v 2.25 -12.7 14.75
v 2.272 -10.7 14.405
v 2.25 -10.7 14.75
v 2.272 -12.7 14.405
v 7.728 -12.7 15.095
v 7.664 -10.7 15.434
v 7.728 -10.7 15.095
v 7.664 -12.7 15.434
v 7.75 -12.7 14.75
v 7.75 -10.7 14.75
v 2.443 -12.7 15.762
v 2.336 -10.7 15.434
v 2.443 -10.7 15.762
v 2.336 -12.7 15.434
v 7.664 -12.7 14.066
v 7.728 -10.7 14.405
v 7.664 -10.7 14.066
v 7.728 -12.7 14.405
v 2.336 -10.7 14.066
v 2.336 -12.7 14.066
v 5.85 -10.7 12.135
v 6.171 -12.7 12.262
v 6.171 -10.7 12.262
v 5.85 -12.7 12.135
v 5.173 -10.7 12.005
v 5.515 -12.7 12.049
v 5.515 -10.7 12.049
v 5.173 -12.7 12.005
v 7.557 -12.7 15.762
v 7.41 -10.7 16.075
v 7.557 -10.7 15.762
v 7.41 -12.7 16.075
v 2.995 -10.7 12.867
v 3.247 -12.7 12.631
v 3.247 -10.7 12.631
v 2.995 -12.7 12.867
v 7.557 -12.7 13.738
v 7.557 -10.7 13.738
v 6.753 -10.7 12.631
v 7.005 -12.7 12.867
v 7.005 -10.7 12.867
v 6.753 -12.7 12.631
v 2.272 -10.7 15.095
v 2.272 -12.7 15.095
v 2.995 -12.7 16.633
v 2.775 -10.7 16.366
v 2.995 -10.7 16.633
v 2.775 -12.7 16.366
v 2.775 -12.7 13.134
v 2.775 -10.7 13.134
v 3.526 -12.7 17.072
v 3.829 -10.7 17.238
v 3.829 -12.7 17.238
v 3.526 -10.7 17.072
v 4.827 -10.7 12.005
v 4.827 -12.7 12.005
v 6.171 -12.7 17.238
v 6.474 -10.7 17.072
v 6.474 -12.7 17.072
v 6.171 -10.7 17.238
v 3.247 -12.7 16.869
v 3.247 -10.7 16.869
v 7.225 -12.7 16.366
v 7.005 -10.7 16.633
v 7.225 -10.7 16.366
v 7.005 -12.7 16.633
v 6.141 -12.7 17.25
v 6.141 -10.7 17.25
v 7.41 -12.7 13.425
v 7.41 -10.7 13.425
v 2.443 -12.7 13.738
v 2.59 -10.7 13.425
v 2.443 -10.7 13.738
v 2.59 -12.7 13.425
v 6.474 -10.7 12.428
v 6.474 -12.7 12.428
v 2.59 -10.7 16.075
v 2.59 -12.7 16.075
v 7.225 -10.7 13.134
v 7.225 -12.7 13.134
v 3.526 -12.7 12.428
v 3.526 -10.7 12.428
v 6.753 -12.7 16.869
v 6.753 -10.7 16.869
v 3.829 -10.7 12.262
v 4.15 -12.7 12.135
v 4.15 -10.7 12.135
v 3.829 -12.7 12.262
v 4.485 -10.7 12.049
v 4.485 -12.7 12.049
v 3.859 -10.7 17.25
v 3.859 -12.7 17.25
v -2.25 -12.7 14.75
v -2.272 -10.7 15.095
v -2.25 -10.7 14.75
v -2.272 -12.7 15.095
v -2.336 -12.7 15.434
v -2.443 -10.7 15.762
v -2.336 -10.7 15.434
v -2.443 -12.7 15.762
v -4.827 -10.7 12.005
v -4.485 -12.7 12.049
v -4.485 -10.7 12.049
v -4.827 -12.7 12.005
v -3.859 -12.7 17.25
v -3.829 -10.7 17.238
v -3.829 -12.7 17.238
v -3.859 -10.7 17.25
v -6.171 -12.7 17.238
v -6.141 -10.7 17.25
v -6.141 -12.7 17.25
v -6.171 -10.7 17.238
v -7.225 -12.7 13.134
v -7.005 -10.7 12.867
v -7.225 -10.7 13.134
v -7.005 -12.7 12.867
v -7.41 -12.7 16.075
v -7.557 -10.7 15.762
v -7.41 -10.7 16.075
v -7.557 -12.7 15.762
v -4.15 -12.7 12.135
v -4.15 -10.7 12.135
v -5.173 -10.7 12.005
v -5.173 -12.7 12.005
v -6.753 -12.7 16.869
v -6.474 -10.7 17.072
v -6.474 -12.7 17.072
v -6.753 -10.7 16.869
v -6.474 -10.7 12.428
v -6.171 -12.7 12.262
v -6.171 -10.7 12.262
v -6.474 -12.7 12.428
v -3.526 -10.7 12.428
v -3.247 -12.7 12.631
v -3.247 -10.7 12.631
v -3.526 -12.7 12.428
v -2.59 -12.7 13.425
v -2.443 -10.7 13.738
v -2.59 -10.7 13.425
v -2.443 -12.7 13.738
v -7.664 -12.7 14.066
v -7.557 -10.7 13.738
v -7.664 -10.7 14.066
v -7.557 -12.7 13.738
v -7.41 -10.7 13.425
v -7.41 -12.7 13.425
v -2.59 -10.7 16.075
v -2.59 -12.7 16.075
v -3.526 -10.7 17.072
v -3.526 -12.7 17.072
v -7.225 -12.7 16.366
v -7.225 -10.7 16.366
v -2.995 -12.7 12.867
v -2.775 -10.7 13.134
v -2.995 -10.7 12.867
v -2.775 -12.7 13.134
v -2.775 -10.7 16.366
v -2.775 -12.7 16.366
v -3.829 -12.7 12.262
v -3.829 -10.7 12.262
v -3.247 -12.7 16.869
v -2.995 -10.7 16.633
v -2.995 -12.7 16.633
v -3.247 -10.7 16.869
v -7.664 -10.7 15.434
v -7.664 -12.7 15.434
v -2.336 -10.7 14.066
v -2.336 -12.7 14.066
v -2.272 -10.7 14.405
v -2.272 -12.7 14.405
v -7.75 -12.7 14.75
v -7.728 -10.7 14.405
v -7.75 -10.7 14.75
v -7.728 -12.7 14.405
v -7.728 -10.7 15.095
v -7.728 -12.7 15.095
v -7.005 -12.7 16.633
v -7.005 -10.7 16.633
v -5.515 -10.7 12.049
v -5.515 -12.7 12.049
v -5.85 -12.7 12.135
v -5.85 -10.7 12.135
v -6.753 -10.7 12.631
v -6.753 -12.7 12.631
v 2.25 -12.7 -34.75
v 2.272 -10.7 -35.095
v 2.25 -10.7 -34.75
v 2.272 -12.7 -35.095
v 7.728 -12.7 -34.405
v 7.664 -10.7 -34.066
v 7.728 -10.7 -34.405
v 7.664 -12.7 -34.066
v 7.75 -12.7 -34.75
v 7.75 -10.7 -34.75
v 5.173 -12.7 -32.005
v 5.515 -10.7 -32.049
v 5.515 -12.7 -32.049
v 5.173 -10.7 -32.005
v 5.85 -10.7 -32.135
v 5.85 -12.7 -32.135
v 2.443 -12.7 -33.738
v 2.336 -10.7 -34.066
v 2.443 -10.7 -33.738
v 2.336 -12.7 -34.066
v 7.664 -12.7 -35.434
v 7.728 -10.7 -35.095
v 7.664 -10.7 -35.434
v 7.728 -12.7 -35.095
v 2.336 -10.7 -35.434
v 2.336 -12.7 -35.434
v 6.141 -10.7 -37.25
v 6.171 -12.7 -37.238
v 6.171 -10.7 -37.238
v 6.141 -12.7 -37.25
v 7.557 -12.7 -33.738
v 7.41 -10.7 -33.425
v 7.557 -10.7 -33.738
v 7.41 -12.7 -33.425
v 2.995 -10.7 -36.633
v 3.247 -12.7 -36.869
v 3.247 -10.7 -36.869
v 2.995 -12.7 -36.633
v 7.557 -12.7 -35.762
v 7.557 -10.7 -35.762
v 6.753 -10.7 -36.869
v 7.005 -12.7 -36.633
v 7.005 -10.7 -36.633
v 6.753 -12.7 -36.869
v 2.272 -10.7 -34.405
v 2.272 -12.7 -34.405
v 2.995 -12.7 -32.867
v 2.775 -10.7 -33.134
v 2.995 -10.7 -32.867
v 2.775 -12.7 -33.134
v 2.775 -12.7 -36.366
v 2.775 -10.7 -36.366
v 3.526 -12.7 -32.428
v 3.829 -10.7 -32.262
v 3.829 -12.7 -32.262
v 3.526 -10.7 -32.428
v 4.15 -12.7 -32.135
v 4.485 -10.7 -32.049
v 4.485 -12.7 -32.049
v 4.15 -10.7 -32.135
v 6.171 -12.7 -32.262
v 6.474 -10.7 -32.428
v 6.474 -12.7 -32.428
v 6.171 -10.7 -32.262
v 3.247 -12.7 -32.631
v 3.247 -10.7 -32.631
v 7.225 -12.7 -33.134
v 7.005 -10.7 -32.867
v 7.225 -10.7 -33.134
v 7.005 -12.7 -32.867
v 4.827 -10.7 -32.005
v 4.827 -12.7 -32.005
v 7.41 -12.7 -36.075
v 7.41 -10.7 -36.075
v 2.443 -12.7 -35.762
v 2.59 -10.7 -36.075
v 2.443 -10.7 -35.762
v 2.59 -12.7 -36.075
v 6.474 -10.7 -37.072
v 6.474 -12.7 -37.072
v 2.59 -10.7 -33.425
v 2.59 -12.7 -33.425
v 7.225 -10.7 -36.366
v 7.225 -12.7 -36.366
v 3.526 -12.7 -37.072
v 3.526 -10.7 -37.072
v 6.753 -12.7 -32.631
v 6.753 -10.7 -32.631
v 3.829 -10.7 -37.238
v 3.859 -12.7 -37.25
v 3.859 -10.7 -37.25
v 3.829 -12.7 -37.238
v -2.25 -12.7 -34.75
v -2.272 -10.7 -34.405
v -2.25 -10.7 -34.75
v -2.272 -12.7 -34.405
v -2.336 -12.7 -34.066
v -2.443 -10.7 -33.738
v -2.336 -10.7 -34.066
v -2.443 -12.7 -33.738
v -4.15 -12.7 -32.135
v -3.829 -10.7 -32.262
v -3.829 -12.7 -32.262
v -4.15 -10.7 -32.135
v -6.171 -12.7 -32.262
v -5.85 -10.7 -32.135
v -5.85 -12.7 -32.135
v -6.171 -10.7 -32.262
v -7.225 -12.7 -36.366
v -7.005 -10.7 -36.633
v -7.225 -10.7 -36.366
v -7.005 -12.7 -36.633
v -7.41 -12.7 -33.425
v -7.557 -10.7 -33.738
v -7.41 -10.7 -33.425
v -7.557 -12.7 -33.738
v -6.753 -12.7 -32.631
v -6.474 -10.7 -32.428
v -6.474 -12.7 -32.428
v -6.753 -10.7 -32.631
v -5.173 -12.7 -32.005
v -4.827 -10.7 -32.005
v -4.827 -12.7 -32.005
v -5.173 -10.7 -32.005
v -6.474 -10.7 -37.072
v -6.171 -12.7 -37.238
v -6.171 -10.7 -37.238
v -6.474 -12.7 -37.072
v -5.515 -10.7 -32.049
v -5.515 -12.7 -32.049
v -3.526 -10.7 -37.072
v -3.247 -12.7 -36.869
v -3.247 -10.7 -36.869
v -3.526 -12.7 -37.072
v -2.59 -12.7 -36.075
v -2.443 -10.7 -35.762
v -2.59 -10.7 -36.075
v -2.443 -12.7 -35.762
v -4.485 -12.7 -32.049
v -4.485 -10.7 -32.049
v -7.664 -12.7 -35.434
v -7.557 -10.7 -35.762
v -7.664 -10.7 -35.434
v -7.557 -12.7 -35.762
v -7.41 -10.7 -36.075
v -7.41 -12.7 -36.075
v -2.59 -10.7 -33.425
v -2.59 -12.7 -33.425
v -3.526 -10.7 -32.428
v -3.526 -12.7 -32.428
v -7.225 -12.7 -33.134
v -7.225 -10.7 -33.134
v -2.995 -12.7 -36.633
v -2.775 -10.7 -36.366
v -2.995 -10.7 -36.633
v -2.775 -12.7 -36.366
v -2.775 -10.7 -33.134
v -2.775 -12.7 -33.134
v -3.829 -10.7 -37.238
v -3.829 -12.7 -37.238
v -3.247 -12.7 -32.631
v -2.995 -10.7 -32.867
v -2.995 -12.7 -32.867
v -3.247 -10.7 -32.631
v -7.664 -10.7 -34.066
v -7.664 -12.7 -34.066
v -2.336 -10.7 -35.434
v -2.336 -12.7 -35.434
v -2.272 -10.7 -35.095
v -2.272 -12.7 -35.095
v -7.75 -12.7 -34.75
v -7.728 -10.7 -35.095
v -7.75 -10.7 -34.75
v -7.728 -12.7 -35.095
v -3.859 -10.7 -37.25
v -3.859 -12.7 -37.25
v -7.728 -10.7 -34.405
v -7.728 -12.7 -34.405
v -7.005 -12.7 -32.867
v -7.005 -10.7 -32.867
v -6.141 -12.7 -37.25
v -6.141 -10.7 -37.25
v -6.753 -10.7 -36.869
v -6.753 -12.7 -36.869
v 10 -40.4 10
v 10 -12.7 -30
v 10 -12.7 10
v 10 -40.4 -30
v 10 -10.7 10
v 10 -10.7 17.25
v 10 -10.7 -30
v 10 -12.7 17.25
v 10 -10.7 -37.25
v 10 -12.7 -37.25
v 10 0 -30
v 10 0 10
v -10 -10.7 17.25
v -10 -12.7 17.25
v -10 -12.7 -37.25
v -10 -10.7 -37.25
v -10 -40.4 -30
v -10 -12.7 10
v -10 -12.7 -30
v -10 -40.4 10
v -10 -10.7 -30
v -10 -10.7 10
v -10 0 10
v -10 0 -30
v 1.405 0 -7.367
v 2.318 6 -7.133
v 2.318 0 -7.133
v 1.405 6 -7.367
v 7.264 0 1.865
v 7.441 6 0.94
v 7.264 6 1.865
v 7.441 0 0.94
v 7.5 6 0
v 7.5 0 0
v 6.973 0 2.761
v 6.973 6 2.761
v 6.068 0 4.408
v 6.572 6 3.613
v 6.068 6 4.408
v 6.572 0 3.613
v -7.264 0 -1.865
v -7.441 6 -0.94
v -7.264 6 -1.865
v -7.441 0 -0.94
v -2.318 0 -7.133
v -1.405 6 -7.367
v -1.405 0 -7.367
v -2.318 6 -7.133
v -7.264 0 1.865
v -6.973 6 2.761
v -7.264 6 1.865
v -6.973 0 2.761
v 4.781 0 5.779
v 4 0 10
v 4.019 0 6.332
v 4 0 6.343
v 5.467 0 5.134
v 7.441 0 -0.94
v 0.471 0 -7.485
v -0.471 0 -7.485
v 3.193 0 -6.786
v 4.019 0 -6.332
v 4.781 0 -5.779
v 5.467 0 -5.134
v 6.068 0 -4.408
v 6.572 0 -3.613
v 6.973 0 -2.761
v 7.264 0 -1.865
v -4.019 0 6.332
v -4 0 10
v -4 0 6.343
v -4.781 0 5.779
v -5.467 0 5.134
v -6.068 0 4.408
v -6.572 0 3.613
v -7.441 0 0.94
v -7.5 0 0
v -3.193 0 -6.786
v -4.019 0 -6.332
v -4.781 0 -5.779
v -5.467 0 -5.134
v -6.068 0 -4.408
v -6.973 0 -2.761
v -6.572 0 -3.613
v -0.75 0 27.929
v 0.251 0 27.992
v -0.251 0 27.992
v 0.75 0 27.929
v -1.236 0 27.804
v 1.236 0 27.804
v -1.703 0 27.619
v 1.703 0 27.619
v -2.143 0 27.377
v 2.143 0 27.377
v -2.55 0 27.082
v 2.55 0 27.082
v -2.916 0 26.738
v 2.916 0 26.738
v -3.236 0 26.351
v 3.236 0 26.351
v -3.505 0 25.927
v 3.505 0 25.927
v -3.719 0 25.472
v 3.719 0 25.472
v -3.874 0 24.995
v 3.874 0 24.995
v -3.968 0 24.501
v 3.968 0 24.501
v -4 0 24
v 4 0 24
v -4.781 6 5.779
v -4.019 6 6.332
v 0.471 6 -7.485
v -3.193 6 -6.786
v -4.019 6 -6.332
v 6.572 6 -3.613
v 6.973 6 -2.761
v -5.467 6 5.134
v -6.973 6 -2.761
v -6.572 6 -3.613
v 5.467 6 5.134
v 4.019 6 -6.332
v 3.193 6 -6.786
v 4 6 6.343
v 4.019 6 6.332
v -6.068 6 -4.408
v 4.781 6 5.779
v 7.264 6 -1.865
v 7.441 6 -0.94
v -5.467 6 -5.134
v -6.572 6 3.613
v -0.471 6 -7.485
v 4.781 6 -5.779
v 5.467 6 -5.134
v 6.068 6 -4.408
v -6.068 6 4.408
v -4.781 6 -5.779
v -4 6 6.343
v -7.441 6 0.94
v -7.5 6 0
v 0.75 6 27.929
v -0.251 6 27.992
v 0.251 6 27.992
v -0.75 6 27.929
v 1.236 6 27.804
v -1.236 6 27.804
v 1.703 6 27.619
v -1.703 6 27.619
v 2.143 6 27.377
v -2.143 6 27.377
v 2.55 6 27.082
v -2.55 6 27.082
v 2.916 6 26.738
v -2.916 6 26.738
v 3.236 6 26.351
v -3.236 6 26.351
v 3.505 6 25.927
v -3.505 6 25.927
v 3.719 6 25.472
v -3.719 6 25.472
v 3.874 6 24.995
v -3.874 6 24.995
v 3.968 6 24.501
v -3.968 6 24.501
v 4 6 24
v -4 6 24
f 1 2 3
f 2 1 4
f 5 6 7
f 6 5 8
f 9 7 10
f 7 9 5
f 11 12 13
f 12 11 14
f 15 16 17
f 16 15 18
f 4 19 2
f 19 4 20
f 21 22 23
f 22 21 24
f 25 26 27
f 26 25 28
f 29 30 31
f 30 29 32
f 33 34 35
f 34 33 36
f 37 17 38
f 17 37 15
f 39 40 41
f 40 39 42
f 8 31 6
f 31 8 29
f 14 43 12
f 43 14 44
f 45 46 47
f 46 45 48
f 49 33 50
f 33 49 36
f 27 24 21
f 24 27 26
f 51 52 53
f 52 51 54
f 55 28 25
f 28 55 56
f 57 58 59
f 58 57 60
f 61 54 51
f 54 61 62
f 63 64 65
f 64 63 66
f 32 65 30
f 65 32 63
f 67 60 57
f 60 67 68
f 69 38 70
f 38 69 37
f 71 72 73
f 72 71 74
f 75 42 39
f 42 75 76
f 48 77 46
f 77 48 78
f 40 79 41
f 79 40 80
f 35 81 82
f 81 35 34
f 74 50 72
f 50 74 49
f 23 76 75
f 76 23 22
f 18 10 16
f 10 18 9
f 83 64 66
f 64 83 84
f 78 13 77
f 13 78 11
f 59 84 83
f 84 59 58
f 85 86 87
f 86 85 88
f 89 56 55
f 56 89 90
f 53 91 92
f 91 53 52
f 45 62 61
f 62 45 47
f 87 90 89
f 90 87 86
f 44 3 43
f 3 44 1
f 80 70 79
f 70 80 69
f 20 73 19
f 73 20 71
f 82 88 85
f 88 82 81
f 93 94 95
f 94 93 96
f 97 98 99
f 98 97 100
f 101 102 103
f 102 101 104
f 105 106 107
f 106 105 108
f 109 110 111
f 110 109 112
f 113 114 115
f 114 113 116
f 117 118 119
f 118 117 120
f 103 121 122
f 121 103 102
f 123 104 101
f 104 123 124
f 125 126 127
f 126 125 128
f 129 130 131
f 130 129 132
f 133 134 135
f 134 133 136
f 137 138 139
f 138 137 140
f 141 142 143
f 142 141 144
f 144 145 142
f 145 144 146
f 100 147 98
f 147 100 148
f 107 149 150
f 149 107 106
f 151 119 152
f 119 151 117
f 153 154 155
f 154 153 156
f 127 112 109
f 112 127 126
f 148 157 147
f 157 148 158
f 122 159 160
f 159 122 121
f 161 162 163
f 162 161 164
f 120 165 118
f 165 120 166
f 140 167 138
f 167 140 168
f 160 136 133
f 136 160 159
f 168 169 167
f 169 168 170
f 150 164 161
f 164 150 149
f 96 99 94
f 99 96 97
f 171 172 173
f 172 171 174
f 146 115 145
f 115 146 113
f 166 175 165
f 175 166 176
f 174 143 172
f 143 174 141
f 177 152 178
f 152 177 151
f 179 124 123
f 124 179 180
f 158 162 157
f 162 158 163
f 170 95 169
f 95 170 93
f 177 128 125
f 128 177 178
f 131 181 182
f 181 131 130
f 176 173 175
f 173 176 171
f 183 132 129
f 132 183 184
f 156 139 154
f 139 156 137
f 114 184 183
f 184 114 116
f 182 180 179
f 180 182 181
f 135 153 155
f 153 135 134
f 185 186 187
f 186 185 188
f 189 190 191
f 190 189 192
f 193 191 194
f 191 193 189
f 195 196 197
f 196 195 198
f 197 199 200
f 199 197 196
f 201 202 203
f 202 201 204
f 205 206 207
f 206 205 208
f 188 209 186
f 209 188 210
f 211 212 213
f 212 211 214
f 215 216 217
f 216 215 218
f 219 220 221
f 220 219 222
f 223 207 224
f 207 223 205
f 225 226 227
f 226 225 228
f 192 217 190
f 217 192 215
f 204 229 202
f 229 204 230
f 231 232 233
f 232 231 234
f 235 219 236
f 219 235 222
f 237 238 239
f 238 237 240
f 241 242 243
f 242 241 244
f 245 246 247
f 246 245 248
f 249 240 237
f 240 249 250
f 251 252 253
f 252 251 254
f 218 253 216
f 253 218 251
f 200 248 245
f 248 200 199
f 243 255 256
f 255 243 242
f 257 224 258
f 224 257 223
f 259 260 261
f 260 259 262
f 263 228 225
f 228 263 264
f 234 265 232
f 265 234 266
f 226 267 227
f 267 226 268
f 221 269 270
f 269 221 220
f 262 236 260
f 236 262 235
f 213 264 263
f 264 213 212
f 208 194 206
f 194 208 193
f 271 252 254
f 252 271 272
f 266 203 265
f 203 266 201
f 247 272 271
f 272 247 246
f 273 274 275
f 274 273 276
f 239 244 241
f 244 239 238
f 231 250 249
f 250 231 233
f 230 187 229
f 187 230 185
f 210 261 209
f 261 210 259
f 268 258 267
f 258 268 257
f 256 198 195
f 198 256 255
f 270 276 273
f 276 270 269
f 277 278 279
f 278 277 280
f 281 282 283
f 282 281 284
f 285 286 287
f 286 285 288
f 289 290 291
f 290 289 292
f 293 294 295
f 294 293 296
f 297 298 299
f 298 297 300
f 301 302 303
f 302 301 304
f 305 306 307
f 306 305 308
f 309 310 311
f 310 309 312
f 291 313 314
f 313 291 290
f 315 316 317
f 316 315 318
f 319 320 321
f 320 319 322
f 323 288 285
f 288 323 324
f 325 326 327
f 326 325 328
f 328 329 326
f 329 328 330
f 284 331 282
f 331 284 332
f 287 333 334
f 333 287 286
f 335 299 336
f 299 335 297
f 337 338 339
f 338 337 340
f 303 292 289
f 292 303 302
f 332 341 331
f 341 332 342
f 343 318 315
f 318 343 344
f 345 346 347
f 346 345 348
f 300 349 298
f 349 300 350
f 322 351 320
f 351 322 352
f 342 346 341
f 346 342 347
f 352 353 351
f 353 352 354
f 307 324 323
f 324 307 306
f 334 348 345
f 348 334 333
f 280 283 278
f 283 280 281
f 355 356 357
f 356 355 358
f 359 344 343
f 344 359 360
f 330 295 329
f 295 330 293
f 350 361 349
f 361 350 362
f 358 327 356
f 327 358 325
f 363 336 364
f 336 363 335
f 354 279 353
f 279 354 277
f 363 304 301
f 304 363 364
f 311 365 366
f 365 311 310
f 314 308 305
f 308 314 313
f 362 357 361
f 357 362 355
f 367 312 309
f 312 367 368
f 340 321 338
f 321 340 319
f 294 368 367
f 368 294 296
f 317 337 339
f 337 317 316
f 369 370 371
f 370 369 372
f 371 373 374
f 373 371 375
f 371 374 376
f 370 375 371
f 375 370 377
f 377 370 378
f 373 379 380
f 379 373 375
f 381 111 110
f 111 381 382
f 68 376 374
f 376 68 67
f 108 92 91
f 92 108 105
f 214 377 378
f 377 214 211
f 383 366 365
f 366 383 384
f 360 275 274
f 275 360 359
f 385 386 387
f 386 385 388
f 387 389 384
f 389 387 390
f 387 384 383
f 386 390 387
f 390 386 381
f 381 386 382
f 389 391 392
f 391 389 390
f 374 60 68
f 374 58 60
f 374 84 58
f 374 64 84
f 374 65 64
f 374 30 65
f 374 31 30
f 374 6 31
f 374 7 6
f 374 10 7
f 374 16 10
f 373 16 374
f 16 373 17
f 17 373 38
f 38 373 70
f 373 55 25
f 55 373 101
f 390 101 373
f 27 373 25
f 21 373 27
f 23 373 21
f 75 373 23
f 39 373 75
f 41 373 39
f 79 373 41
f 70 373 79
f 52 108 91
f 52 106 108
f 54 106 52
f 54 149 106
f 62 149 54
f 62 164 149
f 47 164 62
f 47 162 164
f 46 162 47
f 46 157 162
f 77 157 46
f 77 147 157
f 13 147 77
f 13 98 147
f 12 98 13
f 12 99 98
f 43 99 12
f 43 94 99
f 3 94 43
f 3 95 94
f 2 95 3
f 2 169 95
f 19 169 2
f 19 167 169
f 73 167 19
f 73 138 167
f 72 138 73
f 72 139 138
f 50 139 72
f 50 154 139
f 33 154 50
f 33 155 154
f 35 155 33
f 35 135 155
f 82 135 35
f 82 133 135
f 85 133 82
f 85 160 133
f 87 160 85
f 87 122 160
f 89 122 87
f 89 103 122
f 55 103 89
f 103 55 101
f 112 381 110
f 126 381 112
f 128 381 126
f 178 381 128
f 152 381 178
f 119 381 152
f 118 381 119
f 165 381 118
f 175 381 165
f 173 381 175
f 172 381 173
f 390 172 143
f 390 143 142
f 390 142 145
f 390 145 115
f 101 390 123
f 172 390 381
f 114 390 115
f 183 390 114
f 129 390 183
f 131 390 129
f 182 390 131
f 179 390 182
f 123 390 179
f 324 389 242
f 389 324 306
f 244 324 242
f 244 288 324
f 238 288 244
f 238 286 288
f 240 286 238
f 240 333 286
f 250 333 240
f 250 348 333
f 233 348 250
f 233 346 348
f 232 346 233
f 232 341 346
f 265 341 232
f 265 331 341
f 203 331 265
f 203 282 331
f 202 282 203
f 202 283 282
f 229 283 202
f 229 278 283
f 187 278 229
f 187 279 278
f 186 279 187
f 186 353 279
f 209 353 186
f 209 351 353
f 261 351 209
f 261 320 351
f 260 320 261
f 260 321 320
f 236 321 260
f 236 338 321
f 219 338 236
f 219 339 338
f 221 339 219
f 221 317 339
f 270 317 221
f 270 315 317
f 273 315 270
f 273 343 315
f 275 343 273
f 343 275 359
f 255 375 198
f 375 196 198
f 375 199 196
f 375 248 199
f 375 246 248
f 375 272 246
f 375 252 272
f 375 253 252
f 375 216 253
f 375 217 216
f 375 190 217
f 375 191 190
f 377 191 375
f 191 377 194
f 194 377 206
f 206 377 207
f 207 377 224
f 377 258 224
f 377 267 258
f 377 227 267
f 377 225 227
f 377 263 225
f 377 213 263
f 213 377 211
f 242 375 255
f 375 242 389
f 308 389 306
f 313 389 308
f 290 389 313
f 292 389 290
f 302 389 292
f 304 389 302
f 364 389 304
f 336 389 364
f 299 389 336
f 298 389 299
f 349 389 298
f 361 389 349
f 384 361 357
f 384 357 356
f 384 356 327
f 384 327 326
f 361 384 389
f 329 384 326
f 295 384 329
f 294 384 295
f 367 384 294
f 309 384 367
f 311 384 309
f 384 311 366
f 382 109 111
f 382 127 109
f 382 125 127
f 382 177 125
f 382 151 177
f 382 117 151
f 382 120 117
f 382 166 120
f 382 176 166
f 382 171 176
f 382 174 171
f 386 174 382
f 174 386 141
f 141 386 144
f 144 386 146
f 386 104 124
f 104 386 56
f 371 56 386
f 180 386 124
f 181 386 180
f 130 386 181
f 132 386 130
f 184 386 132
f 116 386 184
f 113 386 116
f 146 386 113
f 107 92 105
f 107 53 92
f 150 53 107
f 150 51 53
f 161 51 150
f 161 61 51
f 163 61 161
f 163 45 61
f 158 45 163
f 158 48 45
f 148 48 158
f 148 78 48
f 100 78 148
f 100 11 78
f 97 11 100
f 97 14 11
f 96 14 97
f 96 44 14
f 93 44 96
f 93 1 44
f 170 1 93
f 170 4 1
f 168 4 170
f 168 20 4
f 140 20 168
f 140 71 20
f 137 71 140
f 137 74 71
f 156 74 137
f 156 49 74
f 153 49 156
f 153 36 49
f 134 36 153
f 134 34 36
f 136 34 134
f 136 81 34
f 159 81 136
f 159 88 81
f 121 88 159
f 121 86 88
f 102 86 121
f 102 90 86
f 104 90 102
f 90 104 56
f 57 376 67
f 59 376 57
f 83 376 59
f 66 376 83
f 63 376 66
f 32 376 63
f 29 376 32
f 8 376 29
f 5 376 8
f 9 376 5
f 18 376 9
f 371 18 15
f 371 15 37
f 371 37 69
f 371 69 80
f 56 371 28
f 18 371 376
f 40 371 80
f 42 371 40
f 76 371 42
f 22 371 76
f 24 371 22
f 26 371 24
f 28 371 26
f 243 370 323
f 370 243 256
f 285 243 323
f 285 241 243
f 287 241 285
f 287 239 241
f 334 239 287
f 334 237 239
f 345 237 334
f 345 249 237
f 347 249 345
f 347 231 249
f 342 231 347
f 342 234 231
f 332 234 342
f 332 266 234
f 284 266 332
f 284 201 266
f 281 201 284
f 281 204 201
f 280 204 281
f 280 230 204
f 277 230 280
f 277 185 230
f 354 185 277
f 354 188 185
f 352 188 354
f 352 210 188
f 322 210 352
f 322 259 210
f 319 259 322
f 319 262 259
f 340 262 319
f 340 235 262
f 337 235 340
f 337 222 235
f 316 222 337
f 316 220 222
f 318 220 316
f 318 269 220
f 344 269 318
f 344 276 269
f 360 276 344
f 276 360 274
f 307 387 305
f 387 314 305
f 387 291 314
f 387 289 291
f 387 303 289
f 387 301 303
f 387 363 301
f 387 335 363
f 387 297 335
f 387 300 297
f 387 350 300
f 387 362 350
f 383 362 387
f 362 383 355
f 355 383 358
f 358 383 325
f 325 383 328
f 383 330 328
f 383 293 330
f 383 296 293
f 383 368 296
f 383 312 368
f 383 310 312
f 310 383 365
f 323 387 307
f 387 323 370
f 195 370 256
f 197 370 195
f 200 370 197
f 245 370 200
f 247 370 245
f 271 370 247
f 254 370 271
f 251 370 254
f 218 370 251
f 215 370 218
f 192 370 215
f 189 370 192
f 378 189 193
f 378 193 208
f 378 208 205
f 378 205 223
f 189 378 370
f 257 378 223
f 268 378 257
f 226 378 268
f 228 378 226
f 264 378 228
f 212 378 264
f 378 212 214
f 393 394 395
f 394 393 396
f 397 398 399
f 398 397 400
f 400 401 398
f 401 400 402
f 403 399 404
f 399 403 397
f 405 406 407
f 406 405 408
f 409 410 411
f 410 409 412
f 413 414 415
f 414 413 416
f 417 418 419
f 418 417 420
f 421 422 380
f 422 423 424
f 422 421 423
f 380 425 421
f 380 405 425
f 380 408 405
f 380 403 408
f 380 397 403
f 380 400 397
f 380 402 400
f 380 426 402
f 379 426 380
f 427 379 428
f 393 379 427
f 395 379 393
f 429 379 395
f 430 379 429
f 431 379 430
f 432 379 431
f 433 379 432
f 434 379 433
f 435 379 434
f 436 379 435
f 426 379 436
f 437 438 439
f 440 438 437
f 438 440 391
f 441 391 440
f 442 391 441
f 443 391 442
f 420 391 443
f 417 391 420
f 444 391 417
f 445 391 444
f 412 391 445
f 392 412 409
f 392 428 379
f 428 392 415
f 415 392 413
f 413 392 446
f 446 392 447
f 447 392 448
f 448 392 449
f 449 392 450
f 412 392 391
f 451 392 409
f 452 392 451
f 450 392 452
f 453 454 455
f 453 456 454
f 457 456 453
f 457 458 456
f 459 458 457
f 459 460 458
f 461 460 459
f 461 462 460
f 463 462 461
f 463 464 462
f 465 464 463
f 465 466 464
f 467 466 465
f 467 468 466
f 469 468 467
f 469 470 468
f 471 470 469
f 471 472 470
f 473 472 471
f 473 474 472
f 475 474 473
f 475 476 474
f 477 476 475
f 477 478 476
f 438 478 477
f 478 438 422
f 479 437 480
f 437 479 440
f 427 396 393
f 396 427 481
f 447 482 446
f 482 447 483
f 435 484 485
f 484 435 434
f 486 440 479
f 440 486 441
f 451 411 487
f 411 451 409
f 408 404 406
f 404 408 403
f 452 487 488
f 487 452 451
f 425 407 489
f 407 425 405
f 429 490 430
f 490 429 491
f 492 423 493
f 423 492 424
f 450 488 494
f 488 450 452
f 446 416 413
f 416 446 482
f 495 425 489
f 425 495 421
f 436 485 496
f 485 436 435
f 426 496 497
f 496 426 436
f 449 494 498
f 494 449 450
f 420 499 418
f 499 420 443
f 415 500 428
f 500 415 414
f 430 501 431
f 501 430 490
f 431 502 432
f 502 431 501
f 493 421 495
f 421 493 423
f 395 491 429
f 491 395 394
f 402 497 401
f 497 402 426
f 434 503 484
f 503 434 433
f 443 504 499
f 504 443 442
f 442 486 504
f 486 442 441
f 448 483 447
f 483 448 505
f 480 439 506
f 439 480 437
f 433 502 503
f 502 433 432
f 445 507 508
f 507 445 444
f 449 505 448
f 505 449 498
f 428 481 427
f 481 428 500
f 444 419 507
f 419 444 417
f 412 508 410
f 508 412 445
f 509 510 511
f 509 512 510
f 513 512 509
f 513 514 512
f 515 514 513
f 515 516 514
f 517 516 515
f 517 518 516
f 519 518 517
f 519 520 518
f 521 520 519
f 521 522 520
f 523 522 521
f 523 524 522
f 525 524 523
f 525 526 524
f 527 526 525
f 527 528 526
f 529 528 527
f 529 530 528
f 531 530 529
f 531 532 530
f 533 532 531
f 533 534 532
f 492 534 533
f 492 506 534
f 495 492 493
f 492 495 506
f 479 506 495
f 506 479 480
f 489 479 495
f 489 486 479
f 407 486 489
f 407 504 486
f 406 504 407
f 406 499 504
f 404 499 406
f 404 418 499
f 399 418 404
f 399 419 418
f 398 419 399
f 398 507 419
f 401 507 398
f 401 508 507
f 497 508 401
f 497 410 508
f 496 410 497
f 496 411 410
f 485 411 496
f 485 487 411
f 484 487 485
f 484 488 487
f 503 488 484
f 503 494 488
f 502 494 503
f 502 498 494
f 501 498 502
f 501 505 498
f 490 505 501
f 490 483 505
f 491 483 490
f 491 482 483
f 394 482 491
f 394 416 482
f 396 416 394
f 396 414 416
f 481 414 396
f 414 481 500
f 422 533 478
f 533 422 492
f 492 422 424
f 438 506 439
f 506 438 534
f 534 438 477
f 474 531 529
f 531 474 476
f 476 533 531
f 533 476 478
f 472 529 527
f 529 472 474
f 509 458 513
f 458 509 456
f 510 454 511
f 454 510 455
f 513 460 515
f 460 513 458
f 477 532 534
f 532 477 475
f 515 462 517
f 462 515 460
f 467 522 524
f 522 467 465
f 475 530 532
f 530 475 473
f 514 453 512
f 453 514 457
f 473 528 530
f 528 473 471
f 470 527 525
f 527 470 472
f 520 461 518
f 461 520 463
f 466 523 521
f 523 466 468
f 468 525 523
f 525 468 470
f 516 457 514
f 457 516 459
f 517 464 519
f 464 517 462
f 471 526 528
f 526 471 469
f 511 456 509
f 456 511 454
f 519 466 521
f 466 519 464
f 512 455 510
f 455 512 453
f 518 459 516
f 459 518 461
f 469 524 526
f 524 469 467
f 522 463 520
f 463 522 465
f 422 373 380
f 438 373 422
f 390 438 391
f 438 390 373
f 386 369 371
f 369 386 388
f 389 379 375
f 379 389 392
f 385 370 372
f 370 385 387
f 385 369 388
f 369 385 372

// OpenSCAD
// copyright: GNU @kuberlog
// https://www.amazon.com/gp/product/B08739MGPL

$fn = 50;

body_x = 20;
body_y = 40.4;
body_z = 40;
body_delta_y = -body_y/2;
body_delta_z = -10; // this dimension, we do not know yet, measure

tab_x = body_x;
tab_y = 2; // this dimension, we also do not know yet, measure
tab_z = 54.5;
tab_delta_y = -(body_y - 27.7 - (tab_y/2));
tab_delta_z = body_delta_z;

hole_d = 5.5;
hole_h = tab_y + 2; //through-hole
hole_delta_y = tab_delta_y + 1;
hole_delta_x = 5;
hole_delta_z = 49.5/2;
holes_delta_z = body_delta_z;
holes_deta_y = -tab_y/2;

horn_y = 6;
horn_delta_y = horn_y/2;
horn_base_d = 15;
horn_extension_z = 24;
horn_tip_d = 8;
horn_extension_x = horn_tip_d;
horn_extension_delta_z = horn_extension_z/2;
horn_tip_delta_z = horn_extension_z;


module body() {
  color([0.1,0.1,0.1]) translate([0, body_delta_y, body_delta_z]) cube([body_x, body_y, body_z], center=true);
}

module tab() {
  difference() {
    color([0.1, 0.1, 0.1]) translate([0, tab_delta_y, tab_delta_z]) cube([tab_x, tab_y, tab_z], center=true);
    holes();
  }
}

module hole() {
  rotate([90,0,0]) cylinder(d=hole_d, h=hole_h, center=true);
}

module holes() {
  color([97/255, 26/255, 26/255]) {
    translate([0,holes_deta_y,body_delta_z]) {
      translate([hole_delta_x, hole_delta_y, hole_delta_z]) hole();
      translate([-hole_delta_x, hole_delta_y, hole_delta_z]) hole();
      translate([hole_delta_x, hole_delta_y, -hole_delta_z]) hole();
      translate([-hole_delta_x, hole_delta_y, -hole_delta_z]) hole();
    }
  }
}

module horn() {
  color([97/255, 26/255, 26/255]) {
    translate([0,horn_delta_y,0]) {
      rotate([90, 0, 0]) cylinder(d=horn_base_d, h=horn_y, center=true);
      translate([0,0,horn_extension_delta_z]) cube([horn_extension_x, horn_y, horn_extension_z], center=true);
      translate([0,0,horn_tip_delta_z]) rotate([90,0,0]) cylinder(d=horn_tip_d, h = horn_y, center=true);
      
    }
  }
}

module Servo25kg(x) {
  body();
  tab();
  rotate([0,x,0]) horn();
}

Servo25kg(/*$t*180*//*animation*/    0/*not animation*/);
